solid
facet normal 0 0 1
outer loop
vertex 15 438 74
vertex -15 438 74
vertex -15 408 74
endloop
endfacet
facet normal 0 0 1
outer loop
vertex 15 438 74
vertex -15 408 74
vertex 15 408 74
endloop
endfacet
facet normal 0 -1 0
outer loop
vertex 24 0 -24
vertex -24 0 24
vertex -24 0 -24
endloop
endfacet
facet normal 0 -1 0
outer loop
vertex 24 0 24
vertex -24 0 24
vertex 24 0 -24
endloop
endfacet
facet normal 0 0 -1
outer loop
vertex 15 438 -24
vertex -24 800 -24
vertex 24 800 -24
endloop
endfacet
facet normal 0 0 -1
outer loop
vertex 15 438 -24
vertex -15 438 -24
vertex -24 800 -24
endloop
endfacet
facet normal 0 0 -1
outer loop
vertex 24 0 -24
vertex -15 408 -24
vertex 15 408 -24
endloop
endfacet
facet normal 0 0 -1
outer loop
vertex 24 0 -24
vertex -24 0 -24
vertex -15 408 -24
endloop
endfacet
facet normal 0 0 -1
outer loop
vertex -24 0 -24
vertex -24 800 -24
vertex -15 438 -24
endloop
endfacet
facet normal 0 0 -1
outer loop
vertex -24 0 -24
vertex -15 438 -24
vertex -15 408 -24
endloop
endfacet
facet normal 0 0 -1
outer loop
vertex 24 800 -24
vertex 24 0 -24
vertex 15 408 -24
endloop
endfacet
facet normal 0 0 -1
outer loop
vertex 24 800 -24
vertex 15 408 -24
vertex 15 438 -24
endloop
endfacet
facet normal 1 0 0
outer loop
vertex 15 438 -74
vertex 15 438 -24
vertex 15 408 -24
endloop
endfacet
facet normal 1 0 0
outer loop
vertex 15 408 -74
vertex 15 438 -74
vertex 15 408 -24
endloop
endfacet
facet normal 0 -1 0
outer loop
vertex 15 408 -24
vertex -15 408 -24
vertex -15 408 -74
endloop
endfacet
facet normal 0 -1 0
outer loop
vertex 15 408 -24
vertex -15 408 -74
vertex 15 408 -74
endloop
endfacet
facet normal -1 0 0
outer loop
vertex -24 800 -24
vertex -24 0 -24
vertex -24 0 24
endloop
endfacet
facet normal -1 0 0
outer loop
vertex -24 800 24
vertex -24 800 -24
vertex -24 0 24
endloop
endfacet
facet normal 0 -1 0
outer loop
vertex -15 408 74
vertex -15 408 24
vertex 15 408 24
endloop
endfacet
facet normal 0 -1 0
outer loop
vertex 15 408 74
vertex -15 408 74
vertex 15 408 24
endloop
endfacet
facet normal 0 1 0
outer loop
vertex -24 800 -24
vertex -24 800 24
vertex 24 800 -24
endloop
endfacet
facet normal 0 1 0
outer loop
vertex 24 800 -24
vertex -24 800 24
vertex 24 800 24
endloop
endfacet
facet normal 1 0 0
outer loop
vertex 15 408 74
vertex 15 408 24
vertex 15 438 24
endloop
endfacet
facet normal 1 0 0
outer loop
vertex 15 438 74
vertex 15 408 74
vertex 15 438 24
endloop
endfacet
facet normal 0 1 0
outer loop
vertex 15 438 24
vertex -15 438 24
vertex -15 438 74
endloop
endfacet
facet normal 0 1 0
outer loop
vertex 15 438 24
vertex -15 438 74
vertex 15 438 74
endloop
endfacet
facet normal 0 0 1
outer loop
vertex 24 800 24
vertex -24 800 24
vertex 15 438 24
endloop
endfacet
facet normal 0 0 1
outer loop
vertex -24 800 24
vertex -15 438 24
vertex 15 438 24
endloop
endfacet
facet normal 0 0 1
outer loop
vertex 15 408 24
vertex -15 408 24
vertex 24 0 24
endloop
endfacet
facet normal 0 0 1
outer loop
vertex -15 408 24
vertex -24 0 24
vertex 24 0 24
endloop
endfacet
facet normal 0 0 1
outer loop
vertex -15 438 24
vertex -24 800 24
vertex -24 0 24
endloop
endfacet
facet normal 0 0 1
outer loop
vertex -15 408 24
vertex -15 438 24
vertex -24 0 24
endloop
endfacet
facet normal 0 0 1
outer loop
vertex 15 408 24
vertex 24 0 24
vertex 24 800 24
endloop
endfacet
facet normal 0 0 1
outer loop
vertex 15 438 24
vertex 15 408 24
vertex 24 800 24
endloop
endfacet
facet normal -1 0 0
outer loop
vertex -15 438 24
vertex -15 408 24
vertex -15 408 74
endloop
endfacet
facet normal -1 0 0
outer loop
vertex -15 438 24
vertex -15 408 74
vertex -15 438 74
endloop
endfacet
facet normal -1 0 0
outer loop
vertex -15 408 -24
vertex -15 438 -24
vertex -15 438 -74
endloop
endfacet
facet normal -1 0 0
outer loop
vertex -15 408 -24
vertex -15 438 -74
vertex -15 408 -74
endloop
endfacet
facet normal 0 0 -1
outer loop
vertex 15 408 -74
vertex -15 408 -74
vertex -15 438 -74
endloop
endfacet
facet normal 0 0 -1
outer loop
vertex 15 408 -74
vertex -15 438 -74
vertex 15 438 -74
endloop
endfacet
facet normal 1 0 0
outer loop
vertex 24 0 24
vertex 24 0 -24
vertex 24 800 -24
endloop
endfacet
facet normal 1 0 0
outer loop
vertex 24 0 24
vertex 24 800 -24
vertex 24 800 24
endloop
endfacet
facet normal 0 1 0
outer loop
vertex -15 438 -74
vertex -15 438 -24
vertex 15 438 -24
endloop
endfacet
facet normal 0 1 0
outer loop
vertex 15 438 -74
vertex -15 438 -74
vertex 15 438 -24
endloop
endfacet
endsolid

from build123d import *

# Parameters (mm, degrees)
F0_W     = 48
F0_H     = 48
F1_DEPTH = 800
F2_W     = 30
F2_H     = 30
F3_DEPTH = 50
F4_W     = 30
F4_H     = 30
F5_DEPTH = 50


with BuildPart() as f1:
    # F0 (on Front) → F1 (new body)
    with BuildSketch(Plane.XZ):
        Rectangle(F0_W, F0_H)
    extrude(amount=-F1_DEPTH)

    # F2 (on face) → F3 (join)
    with BuildSketch(Plane.XY.offset(24)):
        with Locations((0, 423)):
            Rectangle(F2_W, F2_H)
    extrude(amount=F3_DEPTH)

    # F4 (on face) → F5 (join)
    with BuildSketch(Plane(origin=(0, 0, -24), x_dir=(1, 0, 0), z_dir=(0, 0, -1))):
        with Locations((0, -423)):
            Rectangle(F4_W, F4_H)
    extrude(amount=F5_DEPTH)


solid = f1.part
